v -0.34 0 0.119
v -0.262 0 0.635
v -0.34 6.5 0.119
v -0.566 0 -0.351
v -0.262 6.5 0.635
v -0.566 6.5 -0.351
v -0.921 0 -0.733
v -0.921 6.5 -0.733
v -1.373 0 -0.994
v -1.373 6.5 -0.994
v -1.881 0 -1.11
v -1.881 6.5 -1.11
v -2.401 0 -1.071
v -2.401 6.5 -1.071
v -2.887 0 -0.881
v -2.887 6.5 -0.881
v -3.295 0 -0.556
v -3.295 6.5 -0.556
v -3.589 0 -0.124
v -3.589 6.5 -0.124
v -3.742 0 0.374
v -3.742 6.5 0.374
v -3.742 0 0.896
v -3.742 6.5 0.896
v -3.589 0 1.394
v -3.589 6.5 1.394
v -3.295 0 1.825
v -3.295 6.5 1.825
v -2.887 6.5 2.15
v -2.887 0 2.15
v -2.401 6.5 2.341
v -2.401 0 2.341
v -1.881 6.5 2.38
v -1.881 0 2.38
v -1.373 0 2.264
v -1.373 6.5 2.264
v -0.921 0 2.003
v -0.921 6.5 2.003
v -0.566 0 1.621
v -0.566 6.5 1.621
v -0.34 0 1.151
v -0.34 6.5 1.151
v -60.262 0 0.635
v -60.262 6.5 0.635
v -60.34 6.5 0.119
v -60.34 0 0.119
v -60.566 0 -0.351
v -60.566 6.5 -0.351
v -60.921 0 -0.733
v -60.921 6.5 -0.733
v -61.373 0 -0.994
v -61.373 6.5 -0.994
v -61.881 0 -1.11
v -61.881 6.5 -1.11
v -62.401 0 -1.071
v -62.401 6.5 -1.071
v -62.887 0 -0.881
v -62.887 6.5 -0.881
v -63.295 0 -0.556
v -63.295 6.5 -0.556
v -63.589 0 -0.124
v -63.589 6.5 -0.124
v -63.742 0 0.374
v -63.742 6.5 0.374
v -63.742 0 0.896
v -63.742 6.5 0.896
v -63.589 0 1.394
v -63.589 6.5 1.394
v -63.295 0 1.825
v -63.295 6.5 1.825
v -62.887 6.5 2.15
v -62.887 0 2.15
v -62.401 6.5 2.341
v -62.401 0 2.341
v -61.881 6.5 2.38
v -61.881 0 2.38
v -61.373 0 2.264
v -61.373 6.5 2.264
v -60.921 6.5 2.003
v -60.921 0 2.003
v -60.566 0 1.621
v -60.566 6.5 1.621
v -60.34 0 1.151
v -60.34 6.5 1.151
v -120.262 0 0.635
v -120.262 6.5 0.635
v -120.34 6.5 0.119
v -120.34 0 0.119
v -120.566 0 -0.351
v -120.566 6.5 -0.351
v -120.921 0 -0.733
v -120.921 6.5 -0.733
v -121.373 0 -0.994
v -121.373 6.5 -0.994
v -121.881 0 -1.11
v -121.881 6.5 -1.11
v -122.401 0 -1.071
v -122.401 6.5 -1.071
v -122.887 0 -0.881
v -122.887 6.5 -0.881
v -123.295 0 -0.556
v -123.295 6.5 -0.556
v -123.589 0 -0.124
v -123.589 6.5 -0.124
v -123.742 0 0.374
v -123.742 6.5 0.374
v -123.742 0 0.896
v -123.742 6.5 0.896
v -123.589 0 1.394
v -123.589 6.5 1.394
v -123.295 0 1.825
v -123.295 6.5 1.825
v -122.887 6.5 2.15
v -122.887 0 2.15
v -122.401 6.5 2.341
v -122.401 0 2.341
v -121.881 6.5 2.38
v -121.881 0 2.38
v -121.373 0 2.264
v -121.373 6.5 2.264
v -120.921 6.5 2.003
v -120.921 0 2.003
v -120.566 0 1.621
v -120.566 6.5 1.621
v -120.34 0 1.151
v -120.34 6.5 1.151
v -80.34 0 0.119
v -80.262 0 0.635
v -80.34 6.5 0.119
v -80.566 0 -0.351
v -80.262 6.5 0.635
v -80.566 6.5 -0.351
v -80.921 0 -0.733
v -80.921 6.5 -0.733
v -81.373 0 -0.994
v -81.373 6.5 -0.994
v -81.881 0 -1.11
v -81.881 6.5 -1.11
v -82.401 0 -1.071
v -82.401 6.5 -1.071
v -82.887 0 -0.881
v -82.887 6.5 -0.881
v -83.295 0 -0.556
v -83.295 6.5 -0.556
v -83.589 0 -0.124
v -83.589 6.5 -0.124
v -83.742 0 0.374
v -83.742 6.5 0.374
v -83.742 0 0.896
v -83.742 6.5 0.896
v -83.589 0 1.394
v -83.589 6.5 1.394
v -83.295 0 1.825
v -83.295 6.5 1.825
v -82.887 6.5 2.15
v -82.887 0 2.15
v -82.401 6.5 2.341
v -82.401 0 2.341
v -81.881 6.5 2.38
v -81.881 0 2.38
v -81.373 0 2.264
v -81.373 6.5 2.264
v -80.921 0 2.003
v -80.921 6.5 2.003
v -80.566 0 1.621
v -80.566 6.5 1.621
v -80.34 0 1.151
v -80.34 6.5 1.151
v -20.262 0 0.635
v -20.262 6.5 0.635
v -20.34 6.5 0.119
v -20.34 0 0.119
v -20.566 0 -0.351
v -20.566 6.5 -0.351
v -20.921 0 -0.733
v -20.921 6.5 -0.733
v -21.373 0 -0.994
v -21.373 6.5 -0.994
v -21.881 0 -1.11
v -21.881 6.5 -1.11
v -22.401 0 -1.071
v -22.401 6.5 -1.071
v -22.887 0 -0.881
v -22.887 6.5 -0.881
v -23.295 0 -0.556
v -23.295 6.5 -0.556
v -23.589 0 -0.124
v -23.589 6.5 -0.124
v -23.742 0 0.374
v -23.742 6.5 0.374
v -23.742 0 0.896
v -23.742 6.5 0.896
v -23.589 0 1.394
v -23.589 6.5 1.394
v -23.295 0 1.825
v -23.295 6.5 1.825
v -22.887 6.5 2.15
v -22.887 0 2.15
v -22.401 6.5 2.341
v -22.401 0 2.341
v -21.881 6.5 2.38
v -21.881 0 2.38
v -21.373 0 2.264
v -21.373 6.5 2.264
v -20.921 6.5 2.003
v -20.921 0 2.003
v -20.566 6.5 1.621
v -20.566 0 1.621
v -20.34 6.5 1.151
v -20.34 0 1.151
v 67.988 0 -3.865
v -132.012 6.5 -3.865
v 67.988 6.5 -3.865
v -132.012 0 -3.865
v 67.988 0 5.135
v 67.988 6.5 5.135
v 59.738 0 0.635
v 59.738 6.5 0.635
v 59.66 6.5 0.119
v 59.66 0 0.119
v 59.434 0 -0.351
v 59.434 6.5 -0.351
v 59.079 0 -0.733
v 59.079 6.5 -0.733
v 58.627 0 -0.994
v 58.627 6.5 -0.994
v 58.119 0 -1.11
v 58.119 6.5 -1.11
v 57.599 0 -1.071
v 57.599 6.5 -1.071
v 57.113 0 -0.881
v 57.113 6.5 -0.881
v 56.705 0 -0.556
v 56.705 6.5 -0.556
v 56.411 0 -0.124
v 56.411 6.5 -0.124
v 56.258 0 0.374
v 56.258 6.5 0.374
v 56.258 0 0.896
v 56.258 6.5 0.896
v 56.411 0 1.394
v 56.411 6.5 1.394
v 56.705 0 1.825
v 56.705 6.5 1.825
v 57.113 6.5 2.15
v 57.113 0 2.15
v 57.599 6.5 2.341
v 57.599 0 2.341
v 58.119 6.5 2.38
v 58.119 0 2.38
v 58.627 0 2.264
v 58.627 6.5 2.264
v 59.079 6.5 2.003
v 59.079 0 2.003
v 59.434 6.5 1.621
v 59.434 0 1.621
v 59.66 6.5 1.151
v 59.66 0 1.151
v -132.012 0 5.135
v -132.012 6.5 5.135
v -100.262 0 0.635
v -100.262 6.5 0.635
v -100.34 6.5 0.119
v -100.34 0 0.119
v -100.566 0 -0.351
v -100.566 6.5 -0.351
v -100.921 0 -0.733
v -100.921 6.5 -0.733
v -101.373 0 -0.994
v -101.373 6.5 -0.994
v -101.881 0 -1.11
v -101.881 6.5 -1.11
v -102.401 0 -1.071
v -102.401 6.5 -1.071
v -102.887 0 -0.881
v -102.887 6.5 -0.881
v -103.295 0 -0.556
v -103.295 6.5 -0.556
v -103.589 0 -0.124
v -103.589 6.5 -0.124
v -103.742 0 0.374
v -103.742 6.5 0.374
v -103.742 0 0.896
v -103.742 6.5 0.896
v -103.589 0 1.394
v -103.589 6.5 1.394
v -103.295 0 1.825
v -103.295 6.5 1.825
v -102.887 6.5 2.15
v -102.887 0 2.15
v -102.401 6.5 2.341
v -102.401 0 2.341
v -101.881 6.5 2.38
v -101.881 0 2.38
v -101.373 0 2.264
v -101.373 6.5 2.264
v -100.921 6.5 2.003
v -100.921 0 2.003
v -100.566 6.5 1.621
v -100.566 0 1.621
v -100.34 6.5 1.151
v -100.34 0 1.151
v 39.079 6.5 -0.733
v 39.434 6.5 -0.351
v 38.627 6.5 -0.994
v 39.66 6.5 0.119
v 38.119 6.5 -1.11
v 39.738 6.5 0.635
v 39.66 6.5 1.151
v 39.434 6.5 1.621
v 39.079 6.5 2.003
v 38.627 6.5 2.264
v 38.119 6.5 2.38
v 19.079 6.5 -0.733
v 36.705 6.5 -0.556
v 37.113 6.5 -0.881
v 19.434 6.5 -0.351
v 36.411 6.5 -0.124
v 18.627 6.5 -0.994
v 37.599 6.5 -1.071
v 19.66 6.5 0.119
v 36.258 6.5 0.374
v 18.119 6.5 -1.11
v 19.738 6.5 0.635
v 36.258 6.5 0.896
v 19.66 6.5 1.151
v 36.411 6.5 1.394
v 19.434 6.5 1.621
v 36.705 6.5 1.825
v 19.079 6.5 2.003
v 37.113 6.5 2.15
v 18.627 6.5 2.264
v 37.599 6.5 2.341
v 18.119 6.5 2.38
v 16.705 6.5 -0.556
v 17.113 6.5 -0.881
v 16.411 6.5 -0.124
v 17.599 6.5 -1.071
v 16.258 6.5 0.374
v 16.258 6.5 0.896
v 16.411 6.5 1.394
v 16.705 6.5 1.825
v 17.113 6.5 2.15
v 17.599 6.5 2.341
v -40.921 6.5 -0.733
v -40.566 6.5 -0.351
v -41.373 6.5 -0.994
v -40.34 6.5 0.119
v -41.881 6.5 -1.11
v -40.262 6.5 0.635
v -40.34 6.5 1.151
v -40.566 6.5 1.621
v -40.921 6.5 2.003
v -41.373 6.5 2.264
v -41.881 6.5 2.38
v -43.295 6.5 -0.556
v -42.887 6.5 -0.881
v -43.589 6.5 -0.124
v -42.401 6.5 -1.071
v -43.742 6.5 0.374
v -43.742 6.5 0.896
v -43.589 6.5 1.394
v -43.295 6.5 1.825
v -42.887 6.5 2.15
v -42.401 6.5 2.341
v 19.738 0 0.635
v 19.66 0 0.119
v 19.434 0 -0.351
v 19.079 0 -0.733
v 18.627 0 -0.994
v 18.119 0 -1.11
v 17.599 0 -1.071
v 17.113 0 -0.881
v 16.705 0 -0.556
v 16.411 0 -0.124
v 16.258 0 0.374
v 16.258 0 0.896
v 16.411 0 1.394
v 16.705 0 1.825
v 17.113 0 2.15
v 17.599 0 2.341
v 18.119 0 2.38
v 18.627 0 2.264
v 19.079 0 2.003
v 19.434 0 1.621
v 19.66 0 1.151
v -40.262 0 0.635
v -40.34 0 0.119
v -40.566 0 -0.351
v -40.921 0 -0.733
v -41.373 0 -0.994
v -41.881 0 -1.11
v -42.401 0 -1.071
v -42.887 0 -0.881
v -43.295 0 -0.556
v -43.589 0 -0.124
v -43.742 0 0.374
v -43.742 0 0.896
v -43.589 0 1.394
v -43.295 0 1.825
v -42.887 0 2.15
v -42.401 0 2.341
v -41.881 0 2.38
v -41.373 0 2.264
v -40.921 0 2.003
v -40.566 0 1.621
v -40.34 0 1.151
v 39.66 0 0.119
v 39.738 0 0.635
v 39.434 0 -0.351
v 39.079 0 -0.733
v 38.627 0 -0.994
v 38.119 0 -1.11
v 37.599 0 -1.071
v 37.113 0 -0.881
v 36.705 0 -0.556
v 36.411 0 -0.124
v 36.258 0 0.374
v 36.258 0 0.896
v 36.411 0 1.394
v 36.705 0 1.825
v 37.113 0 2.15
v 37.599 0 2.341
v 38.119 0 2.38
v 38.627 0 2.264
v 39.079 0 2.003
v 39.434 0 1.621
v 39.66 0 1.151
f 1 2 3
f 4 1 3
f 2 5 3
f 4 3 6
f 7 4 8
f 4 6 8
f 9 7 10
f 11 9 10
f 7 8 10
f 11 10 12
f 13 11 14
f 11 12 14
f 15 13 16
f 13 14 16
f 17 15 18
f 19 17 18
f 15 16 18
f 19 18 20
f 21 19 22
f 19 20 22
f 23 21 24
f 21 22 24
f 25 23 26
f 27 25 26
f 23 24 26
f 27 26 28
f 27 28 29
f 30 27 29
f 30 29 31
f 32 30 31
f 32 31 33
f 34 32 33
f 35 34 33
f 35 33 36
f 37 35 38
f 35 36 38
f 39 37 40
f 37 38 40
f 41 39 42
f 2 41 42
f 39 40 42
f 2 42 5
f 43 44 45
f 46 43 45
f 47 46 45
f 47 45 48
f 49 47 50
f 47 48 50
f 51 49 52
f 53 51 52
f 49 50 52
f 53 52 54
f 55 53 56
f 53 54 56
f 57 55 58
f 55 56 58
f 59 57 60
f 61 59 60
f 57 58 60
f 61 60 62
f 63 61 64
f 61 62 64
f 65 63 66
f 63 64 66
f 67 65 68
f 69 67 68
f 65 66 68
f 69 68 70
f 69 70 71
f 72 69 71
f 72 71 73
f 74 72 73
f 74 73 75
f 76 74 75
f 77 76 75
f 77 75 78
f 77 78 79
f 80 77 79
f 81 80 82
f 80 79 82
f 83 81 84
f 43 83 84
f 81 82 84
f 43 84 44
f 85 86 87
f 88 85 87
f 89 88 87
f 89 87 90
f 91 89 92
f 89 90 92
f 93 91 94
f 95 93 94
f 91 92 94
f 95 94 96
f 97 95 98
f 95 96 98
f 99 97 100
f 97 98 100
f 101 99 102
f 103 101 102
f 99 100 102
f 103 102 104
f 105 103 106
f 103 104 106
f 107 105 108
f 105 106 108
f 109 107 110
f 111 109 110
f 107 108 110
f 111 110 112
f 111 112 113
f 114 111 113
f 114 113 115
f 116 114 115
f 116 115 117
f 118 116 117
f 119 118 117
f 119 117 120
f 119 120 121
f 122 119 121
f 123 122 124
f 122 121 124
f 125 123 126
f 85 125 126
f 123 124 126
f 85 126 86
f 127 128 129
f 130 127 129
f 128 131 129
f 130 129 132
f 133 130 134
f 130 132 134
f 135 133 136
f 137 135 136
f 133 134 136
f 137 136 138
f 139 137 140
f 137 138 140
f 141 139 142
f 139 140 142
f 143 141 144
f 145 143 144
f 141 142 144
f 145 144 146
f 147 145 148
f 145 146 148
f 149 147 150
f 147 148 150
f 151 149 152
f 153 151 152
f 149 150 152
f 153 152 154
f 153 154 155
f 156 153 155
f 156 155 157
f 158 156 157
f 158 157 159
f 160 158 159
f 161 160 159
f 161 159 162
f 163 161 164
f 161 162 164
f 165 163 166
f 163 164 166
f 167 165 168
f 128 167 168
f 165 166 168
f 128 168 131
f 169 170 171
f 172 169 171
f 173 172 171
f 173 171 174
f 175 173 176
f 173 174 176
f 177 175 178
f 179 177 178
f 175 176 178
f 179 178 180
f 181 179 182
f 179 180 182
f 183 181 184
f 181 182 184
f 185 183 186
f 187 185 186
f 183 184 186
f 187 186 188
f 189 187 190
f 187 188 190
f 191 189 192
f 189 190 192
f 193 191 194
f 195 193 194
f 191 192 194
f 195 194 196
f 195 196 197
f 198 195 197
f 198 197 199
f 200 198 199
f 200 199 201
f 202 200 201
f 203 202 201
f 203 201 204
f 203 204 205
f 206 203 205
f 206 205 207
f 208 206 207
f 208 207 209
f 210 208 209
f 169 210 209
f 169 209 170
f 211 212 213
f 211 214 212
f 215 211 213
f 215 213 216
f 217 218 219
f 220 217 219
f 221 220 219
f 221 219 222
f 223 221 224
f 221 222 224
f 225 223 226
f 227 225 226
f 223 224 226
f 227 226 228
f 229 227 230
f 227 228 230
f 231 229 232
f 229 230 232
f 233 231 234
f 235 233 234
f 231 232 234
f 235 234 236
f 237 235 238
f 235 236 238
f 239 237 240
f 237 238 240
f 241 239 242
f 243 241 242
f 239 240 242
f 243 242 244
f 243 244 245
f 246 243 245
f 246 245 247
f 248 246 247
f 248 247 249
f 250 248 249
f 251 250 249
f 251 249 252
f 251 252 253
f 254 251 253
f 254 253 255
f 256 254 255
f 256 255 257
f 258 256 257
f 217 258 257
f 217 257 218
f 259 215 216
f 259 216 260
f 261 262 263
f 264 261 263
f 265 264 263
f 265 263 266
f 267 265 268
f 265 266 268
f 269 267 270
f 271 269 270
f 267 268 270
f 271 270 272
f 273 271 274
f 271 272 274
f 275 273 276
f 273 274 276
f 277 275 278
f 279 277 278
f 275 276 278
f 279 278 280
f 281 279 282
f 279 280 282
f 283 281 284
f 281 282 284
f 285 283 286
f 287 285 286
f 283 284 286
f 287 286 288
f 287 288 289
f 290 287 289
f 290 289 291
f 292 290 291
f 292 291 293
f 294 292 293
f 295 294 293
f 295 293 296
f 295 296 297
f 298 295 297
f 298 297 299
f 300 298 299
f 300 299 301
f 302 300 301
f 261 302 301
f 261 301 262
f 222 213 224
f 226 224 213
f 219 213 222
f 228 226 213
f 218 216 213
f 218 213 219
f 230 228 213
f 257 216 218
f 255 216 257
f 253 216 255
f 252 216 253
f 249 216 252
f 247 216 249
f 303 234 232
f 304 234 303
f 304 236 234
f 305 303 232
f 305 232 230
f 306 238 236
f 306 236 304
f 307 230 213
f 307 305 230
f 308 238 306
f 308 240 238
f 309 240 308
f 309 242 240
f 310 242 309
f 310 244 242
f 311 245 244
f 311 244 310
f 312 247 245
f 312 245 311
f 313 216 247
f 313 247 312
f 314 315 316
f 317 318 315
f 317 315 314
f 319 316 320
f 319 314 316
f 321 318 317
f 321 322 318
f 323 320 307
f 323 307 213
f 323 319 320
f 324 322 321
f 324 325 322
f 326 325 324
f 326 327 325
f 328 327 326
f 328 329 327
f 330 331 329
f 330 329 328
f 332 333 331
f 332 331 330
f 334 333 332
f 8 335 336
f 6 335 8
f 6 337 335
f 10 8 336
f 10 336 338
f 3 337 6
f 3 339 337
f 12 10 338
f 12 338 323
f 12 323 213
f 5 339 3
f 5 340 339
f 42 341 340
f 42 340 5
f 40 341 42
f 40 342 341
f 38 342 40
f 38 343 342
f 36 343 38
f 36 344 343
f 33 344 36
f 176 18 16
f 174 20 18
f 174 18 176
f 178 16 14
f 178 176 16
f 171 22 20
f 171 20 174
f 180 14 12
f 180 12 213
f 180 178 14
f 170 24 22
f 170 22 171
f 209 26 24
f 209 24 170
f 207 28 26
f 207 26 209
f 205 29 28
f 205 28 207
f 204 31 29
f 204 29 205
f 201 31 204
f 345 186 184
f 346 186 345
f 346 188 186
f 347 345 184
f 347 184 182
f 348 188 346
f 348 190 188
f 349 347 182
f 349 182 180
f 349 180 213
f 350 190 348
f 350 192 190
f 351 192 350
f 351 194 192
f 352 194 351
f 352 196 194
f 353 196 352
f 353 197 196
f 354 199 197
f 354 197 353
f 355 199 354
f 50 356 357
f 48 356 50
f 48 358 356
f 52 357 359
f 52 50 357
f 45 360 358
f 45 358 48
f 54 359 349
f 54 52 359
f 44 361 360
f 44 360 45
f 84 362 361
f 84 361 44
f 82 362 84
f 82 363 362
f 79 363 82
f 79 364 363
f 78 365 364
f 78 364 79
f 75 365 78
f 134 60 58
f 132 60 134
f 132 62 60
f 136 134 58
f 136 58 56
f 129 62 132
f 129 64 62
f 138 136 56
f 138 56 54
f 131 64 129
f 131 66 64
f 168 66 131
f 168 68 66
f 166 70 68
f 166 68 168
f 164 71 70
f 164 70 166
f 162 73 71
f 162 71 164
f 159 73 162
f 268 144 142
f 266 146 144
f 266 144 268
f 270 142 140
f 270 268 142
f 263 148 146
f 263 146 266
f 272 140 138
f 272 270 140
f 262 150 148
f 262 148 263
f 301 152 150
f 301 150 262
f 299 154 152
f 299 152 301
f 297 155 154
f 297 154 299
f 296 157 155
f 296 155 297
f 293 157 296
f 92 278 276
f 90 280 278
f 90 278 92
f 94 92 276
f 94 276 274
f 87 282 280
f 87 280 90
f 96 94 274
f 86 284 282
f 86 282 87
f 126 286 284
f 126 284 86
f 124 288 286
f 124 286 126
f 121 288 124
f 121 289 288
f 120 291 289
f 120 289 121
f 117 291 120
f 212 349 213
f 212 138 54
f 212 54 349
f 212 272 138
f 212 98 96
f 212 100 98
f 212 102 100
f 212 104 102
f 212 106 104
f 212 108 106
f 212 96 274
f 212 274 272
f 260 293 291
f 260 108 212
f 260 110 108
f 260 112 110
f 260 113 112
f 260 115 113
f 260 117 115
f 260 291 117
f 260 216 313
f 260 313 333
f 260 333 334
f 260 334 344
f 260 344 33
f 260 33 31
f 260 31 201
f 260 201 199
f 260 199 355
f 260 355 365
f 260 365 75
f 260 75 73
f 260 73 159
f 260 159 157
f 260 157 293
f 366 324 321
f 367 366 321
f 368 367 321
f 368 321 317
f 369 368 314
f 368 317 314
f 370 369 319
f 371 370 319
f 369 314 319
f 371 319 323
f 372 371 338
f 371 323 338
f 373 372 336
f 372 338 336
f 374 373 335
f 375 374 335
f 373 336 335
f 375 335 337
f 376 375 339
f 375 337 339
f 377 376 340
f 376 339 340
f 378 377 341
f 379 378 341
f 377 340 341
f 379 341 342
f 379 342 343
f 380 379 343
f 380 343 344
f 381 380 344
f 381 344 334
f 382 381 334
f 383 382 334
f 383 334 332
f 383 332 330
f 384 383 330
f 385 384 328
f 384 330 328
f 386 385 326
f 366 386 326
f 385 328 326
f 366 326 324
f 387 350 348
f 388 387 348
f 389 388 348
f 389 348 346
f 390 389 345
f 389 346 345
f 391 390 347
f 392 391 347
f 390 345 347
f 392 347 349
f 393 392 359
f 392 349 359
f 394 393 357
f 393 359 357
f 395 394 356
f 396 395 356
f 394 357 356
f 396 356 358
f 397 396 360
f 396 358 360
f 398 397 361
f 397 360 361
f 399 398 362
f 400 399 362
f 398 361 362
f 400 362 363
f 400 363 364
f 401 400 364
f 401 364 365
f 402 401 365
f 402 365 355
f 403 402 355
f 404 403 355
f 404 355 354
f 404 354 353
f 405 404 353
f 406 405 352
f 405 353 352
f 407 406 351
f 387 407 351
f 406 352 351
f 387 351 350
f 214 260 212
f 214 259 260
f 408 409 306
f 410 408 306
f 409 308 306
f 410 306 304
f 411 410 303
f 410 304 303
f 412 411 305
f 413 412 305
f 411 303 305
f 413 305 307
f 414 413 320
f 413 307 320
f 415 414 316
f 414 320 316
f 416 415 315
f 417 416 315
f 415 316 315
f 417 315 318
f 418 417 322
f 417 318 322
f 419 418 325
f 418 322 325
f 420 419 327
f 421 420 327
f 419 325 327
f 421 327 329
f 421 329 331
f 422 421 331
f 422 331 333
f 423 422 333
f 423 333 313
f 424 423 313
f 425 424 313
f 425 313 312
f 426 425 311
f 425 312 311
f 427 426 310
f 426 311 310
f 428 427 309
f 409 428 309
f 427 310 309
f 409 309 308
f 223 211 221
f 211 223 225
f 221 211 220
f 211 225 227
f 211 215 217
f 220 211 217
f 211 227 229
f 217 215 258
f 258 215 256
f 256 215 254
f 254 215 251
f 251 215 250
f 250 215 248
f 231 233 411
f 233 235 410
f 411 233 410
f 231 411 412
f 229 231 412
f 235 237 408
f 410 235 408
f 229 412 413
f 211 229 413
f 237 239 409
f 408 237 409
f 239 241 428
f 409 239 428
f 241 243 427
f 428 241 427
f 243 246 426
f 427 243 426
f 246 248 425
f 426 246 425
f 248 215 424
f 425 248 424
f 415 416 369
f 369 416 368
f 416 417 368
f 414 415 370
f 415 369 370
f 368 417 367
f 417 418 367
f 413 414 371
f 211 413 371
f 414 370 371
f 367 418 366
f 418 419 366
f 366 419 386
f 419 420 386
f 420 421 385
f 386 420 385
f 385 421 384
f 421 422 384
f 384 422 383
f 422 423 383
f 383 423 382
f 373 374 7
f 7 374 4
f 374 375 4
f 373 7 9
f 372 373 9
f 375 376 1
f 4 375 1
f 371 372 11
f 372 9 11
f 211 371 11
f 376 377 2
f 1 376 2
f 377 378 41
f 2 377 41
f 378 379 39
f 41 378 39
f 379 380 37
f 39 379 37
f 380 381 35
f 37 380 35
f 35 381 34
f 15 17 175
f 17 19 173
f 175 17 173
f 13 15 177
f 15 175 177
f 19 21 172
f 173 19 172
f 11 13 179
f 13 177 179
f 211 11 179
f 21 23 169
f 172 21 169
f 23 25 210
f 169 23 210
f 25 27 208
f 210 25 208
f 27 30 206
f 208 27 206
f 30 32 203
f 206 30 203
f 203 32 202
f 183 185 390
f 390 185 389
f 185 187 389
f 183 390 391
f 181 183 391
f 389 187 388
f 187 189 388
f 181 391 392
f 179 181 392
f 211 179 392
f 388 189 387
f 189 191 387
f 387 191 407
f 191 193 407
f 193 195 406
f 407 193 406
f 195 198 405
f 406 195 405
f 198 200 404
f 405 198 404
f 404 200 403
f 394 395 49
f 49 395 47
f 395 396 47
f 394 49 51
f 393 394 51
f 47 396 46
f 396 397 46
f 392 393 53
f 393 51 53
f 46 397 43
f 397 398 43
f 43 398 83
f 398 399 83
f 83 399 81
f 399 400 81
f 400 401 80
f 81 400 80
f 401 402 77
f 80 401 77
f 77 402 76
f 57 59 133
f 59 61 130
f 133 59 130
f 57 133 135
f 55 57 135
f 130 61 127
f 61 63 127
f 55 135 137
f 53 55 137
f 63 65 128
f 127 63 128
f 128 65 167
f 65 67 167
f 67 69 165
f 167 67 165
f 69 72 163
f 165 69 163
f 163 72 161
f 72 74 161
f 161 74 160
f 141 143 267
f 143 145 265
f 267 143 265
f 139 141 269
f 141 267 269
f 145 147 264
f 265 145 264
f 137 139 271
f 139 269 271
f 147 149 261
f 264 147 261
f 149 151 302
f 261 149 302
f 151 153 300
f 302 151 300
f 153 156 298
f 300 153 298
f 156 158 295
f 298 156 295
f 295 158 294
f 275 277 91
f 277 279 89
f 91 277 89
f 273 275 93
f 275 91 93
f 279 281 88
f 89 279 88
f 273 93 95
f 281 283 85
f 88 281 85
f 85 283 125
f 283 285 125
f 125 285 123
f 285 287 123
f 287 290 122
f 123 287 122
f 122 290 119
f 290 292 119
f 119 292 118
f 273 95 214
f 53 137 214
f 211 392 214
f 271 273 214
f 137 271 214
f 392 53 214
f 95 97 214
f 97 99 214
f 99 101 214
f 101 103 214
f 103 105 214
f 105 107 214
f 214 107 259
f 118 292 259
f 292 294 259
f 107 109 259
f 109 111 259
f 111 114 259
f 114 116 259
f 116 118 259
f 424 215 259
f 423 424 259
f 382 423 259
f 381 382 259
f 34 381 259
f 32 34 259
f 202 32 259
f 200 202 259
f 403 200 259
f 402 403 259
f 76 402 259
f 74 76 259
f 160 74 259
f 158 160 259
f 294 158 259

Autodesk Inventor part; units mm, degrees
ref_plane "YZ Plane" through (0, 0, 0) normal (1, 0, 0) x (0, 1, 0)
ref_plane "XZ Plane" through (0, 0, 0) normal (0, 1, 0) x (-1, 0, 0)
ref_plane "XY Plane" through (0, 0, 0) normal (0, 0, 1) x (1, 0, 0)
sketch "Sketch1" plane through (0, 0, 0) normal (0, 1, 0) x (-1, 0, 0)
  line L0 (132.0119, -3.8652) -> (-67.9881, -3.8652)
  line L1 (-67.9881, -3.8652) -> (-67.9881, 5.1348)
  line L2 (-67.9881, 5.1348) -> (132.0119, 5.1348)
  line L3 (132.0119, 5.1348) -> (132.0119, -3.8652)
  point P0 (0, 0)
  dimension "d0" = 200
  dimension "d1" = 9
extrude "Extrusion1" add sketch "Sketch1" along normal blind 6.5
sketch "Sketch2" plane through (0, 6.5, 0) normal (0, 1, 0) x (1, 0, 0)
  circle A0 centre (57.9881, -0.6348) radius 1.75
  line L0 (67.9881, 3.8652) -> (-132.0119, 3.8652) projected
  line L1 (67.9881, -5.1348) -> (67.9881, 3.8652) projected
  circle A1 centre (37.9881, -0.6348) radius 1.75
  circle A2 centre (17.9881, -0.6348) radius 1.75
  circle A3 centre (-2.0119, -0.6348) radius 1.75
  circle A4 centre (-22.0119, -0.6348) radius 1.75
  circle A5 centre (-42.0119, -0.6348) radius 1.75
  circle A6 centre (-62.0119, -0.6348) radius 1.75
  circle A7 centre (-82.0119, -0.6348) radius 1.75
  circle A8 centre (-102.0119, -0.6348) radius 1.75
  circle A9 centre (-122.0119, -0.6348) radius 1.75
  point P0 (0, 0)
  dimension "d4" = 3.5
  dimension "d5" = 4.5
  dimension "d6" = 10
  dimension "d9" = 20
extrude "Extrusion2" cut sketch "Sketch2" against normal through all
properties part number "MGN9x200mm_rail"
